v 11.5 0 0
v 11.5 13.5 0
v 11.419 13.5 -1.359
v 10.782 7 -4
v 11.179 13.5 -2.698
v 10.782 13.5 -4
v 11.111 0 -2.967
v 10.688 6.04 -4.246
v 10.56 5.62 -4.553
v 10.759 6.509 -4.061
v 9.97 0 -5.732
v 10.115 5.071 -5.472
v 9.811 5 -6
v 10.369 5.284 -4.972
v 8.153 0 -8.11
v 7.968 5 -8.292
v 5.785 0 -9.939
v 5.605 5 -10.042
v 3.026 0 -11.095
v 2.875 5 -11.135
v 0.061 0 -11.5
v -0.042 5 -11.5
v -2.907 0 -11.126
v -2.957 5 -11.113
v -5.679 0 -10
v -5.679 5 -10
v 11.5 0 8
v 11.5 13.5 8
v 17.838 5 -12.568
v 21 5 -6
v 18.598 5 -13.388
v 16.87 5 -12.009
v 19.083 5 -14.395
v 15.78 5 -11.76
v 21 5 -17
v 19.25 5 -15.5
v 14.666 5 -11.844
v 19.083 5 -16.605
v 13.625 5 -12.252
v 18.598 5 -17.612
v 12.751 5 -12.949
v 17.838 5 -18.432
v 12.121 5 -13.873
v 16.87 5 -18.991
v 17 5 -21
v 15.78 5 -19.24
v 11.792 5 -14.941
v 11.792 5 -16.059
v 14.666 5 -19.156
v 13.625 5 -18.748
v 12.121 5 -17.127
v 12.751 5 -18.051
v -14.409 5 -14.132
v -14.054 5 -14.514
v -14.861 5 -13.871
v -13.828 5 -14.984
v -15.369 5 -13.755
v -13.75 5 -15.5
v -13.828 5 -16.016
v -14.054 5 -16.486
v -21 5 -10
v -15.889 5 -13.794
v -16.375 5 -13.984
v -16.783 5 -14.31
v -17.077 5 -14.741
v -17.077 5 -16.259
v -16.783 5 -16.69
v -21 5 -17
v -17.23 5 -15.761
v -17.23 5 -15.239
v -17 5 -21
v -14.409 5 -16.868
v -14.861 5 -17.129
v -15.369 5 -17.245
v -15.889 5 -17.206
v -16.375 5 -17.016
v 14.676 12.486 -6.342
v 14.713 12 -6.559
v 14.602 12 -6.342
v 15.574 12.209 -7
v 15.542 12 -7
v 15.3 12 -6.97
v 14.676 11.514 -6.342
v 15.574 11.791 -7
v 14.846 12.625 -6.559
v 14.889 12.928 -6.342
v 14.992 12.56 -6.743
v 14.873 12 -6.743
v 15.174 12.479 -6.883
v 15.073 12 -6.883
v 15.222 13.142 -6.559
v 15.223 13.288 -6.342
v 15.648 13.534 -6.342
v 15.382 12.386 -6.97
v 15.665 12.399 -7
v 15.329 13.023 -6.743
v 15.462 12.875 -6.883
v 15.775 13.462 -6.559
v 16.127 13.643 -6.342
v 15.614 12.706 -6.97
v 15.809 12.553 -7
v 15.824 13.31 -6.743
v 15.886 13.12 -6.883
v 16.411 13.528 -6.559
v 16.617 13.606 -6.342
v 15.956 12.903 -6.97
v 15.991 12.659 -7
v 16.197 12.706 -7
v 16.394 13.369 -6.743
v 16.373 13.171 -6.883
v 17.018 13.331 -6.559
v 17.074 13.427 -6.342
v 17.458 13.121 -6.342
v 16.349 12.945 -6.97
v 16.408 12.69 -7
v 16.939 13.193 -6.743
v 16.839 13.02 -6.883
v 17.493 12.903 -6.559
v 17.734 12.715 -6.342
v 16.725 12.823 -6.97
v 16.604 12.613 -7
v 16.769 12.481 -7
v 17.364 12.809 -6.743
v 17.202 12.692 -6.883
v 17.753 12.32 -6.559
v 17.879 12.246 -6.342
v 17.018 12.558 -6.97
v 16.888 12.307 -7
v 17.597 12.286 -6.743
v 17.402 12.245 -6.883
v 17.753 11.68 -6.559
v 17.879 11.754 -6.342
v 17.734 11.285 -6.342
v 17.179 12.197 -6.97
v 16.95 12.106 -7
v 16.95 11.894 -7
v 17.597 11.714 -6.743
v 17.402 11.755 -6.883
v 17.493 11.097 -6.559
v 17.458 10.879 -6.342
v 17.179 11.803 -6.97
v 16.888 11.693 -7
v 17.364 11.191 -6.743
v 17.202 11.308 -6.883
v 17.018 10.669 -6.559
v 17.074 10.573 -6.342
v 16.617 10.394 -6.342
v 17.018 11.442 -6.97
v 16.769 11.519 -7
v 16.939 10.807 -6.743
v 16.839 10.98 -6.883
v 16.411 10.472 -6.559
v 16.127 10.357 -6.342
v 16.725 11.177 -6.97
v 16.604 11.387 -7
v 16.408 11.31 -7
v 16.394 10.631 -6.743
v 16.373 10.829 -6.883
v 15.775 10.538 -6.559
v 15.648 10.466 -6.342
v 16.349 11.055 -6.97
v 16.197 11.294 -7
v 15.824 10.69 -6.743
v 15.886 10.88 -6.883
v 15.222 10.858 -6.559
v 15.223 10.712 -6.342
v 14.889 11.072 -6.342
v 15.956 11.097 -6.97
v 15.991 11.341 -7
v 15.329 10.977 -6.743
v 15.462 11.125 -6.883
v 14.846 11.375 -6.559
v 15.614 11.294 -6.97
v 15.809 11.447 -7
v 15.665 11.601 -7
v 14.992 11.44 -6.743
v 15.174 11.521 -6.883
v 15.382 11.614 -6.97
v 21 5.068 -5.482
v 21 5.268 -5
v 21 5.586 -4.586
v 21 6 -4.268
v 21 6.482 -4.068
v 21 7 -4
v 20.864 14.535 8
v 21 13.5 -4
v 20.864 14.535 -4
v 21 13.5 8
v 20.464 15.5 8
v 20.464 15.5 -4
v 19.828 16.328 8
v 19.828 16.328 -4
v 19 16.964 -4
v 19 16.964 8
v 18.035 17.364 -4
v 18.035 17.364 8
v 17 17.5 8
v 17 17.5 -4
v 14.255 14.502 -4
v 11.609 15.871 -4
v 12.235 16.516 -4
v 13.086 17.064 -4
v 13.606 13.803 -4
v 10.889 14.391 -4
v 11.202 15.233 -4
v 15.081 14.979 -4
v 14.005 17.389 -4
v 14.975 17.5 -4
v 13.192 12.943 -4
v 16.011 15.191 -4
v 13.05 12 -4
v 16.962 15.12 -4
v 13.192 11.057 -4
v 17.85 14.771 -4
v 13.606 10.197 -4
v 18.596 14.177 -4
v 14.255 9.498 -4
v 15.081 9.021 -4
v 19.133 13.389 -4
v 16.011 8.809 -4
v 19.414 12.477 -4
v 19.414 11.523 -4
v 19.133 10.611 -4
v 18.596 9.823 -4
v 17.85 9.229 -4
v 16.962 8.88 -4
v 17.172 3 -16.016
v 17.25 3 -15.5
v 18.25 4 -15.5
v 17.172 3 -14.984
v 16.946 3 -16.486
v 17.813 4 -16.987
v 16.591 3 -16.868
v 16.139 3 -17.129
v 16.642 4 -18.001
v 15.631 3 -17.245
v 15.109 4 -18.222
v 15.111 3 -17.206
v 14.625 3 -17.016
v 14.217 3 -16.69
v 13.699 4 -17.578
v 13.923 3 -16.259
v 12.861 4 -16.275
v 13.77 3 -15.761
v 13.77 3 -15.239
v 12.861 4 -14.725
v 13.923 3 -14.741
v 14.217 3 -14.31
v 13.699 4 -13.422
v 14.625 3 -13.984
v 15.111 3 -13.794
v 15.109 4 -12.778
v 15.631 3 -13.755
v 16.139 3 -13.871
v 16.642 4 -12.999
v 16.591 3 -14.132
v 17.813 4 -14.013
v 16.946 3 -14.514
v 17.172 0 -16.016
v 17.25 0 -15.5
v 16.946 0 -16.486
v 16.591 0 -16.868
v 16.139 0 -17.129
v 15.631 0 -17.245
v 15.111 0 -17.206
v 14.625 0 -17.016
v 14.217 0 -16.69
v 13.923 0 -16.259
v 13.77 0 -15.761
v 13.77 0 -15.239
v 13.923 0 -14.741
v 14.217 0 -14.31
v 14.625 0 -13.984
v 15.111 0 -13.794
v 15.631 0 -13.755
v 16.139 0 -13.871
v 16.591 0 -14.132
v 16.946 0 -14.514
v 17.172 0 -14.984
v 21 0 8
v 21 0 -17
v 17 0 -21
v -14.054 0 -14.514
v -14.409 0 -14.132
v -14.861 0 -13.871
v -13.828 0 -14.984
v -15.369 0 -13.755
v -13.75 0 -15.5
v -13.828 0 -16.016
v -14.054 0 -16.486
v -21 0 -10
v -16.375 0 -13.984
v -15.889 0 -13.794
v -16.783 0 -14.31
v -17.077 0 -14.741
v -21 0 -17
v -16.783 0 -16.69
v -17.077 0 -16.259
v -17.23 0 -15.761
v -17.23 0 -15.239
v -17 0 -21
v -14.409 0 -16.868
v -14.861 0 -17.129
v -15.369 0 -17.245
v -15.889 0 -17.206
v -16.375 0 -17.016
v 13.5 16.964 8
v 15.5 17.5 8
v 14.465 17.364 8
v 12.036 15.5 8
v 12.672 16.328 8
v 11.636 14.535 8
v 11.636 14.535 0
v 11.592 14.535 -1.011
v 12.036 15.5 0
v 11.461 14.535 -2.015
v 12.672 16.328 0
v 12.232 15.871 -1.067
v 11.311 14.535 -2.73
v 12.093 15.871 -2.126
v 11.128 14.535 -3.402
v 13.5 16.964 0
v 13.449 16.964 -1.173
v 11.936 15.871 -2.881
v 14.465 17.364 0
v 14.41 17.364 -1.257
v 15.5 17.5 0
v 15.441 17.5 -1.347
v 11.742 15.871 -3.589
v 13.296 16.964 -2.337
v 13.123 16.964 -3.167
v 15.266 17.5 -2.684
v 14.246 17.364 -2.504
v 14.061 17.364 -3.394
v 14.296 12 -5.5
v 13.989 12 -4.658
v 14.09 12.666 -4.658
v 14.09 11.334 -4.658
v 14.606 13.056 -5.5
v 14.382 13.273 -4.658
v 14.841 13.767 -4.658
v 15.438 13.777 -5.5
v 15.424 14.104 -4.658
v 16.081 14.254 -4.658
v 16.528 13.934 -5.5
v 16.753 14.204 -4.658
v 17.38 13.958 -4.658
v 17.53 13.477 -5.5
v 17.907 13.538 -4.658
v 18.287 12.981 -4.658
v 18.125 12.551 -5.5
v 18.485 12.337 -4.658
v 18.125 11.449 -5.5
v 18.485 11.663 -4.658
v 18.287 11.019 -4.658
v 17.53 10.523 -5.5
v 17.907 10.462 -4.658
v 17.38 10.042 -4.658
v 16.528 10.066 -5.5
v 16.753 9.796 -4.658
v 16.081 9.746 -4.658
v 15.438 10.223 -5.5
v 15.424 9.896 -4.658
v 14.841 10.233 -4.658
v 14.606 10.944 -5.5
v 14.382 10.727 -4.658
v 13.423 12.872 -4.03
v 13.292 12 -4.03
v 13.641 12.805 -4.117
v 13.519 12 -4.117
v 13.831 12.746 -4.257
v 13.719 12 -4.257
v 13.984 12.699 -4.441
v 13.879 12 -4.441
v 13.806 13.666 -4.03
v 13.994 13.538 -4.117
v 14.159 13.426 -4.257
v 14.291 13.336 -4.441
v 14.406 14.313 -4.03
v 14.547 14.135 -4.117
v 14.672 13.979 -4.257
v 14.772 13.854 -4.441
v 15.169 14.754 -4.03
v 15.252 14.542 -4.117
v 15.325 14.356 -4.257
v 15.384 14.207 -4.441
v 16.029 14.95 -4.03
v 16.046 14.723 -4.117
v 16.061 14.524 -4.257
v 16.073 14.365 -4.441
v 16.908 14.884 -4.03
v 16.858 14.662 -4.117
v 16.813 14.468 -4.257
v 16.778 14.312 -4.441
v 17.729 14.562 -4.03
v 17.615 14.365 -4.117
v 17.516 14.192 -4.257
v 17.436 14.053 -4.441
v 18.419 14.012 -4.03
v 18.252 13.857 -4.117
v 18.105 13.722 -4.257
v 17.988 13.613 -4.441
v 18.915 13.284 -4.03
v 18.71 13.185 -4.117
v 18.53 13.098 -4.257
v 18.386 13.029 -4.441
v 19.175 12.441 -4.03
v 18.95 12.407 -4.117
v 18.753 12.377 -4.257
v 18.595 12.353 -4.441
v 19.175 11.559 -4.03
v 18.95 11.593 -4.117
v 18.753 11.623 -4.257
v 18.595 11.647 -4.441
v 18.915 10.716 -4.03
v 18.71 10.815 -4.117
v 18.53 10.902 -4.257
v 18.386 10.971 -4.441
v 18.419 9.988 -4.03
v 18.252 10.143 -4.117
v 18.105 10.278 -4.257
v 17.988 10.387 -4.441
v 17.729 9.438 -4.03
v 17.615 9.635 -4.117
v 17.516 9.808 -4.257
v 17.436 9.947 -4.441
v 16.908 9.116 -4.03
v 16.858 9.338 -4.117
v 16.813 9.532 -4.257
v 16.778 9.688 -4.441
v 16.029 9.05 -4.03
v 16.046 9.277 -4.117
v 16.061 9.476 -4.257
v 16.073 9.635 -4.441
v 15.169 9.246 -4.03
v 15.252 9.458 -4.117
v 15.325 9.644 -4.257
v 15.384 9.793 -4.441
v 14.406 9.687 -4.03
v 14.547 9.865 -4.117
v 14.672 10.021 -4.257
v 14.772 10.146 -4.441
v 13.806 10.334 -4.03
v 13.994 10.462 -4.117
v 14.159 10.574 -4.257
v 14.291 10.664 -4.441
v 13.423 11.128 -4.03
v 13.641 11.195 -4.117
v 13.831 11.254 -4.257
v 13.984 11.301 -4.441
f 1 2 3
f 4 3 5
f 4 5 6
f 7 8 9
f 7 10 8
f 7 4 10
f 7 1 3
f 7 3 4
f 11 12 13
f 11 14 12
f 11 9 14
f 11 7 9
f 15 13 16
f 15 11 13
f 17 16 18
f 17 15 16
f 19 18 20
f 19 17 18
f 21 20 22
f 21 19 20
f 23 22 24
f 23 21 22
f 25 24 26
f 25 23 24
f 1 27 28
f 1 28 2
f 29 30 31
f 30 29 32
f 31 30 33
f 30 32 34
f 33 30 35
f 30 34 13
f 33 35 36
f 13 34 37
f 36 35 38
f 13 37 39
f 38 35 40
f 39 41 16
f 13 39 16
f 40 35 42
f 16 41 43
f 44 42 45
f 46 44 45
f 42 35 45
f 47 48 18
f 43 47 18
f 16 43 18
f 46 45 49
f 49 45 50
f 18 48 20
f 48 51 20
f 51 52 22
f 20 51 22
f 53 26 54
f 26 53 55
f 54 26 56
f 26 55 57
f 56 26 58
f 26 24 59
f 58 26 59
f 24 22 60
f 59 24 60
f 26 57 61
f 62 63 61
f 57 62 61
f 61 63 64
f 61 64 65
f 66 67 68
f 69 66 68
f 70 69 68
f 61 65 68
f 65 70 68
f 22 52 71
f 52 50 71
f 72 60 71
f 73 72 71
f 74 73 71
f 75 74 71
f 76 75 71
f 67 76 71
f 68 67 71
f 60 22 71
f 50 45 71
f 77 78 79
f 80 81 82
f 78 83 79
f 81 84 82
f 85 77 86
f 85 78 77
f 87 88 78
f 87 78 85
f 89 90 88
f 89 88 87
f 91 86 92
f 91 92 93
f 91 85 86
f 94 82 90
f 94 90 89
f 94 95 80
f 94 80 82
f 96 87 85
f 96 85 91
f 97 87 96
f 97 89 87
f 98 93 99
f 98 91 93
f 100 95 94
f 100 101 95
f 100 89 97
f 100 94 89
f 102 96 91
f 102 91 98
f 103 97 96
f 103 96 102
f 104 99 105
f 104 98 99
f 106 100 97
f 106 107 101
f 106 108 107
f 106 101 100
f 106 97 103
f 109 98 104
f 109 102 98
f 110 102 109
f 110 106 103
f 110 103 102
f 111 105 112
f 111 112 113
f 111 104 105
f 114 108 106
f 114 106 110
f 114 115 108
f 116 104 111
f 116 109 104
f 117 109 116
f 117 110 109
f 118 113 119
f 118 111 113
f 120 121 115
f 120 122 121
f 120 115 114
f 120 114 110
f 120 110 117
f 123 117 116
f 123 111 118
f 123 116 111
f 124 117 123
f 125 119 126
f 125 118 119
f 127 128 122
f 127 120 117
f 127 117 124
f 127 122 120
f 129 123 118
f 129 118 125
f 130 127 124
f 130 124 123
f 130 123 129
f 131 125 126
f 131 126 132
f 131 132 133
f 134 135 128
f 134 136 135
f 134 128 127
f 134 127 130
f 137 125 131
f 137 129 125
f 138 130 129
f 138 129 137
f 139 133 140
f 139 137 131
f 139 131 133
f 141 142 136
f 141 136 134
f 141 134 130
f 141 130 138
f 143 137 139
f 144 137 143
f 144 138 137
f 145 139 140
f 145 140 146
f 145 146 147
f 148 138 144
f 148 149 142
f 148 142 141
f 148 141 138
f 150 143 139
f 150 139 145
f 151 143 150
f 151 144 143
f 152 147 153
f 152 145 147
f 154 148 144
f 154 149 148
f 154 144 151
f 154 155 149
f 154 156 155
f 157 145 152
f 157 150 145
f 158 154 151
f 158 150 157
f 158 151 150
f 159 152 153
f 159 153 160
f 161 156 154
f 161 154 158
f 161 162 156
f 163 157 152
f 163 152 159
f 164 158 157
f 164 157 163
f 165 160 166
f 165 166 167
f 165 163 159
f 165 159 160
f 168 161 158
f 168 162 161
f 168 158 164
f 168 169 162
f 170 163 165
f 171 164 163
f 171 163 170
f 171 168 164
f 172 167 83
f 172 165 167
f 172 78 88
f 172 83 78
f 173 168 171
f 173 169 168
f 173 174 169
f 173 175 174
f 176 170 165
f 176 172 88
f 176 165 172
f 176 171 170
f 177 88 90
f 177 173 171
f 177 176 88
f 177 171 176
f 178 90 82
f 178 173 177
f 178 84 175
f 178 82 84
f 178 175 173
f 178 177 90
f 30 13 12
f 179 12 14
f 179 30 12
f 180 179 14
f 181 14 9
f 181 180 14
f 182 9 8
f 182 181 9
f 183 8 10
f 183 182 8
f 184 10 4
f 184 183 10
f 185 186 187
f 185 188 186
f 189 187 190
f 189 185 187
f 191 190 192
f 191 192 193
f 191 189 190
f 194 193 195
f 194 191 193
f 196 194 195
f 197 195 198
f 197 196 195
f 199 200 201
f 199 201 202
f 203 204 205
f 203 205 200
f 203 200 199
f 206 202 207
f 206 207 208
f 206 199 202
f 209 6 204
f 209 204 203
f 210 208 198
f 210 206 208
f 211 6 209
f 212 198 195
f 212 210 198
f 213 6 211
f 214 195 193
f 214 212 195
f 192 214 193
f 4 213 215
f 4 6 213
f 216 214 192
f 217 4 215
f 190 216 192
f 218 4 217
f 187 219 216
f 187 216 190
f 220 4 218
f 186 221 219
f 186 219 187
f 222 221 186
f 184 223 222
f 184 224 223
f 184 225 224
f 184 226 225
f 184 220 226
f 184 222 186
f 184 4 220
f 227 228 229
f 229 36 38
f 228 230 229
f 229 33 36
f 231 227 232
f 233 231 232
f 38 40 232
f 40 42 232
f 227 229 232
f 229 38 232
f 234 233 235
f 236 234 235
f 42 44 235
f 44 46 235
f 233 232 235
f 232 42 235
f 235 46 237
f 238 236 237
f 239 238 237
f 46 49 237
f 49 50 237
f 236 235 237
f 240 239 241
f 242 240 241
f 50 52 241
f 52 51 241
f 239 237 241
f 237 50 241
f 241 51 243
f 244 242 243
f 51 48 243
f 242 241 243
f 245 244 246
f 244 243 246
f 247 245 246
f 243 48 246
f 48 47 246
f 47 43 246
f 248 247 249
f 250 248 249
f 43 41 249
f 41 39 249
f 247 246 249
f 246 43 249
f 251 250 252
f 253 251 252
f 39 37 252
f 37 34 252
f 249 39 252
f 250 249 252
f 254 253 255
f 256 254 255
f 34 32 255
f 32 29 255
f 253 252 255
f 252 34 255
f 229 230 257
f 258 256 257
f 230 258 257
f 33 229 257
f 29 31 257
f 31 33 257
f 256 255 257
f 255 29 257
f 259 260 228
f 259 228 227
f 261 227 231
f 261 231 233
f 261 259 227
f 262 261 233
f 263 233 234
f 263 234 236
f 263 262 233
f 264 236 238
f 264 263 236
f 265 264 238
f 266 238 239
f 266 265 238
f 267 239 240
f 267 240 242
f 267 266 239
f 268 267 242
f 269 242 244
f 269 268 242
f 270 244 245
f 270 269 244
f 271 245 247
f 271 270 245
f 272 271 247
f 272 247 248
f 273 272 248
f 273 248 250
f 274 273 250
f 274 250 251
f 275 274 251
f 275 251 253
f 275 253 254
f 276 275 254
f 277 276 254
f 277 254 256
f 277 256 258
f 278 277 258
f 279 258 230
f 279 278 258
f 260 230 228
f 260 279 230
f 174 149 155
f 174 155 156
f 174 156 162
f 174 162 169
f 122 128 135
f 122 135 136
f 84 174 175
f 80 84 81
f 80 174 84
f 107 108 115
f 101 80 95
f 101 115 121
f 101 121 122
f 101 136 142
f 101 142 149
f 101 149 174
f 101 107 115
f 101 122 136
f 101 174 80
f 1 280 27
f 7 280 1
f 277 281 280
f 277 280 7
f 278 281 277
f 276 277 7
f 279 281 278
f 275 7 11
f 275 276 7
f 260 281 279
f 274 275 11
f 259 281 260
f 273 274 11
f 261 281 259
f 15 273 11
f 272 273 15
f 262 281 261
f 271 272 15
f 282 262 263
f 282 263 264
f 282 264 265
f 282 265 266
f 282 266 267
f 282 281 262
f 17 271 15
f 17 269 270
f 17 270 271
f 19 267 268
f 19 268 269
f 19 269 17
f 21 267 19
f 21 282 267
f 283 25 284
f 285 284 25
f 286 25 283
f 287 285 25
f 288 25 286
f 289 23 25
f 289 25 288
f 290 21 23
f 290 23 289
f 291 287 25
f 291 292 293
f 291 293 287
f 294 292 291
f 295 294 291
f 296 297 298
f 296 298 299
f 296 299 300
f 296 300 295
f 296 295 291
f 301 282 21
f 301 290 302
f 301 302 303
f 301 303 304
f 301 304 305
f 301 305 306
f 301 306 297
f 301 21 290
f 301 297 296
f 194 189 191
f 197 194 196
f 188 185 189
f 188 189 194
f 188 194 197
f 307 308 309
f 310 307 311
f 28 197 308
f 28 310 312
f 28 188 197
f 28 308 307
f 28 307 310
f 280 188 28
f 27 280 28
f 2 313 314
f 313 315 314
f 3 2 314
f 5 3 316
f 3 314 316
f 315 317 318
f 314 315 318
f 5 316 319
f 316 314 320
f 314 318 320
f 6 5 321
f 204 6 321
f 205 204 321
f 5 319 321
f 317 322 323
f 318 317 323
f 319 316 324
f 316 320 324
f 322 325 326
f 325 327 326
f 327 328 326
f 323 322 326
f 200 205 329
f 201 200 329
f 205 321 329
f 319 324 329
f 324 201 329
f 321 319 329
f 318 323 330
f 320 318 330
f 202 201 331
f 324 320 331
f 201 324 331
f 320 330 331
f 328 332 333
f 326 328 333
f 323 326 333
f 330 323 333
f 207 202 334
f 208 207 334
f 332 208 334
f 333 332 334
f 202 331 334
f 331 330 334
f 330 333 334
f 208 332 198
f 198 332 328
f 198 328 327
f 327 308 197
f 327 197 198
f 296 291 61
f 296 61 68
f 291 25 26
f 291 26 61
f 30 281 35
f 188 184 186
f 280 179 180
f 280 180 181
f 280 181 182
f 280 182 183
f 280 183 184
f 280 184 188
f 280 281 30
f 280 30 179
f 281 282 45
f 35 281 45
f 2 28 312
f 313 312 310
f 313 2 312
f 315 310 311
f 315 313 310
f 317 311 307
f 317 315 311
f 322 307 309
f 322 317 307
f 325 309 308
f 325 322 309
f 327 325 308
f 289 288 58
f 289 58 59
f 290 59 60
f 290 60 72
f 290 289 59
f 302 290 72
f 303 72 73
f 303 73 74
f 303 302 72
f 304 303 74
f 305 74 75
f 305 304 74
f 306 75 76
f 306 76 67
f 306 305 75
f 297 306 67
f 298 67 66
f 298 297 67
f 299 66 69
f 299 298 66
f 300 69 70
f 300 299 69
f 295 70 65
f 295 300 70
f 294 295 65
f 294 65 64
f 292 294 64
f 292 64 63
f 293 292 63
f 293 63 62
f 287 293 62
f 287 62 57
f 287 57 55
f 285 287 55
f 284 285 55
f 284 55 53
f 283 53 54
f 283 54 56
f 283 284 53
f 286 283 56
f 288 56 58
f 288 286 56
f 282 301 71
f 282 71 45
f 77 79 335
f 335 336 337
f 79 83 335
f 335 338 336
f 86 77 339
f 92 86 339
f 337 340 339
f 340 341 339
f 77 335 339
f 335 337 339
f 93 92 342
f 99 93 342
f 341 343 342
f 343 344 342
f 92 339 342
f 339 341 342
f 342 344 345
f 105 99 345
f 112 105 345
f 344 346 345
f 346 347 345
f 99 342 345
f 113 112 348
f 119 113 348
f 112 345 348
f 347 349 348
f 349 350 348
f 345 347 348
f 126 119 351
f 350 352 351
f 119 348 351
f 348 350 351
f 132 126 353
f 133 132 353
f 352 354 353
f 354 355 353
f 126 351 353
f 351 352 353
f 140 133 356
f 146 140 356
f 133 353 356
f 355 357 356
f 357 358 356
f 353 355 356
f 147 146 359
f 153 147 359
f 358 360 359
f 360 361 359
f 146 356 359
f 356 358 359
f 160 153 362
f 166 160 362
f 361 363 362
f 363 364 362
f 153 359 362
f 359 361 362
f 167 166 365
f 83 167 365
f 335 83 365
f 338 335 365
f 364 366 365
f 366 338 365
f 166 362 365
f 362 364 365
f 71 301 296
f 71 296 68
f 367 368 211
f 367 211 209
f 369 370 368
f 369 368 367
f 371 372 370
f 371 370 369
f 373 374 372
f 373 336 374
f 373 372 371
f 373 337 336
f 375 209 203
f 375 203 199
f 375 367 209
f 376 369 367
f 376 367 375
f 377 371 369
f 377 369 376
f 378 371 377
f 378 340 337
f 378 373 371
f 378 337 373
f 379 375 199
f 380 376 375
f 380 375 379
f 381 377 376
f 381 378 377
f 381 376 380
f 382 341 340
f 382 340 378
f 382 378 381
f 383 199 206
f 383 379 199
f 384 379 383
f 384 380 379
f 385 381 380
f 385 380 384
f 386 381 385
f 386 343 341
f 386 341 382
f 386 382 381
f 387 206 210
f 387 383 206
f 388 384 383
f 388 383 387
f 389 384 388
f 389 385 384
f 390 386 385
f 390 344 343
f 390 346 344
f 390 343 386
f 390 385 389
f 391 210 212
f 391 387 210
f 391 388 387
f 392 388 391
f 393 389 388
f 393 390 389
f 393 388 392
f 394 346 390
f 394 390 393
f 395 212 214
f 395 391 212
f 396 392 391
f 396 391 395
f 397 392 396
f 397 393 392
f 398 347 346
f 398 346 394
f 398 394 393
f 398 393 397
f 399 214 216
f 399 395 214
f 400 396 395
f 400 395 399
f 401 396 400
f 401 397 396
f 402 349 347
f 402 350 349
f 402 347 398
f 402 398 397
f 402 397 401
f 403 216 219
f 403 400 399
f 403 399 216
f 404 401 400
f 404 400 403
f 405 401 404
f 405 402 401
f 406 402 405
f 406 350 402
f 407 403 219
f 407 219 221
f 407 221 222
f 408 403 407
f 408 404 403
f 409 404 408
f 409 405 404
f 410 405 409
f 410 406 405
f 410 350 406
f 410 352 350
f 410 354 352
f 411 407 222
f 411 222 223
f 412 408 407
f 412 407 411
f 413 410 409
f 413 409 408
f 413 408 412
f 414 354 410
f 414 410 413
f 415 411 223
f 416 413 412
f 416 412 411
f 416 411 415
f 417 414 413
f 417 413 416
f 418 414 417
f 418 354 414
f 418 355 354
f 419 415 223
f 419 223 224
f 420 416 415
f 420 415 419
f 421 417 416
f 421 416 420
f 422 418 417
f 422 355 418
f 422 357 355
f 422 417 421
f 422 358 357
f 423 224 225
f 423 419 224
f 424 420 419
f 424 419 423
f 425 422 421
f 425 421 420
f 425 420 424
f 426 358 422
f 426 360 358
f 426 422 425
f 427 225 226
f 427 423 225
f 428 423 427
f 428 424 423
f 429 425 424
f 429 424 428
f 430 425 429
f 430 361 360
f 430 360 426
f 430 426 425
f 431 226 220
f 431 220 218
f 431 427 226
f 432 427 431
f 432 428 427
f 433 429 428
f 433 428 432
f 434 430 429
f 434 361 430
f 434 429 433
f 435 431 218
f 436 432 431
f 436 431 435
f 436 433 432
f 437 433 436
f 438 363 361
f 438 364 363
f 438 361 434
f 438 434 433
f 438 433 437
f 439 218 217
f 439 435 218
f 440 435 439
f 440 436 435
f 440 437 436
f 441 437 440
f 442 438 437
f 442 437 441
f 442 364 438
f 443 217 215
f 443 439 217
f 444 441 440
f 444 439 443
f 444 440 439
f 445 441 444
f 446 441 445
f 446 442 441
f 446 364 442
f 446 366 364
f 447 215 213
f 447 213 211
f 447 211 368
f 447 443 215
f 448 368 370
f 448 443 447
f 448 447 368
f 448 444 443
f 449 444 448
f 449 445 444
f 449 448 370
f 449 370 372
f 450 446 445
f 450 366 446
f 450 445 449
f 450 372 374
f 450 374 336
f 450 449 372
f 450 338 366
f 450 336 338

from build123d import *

# Parameters (mm, degrees)
CROQUIS1_R              = 1.75
SALIENTE_EXTRUIR1_DEPTH = 5
CHAFL_N1_SIZE           = 2
SALIENTE_EXTRUIR2_DEPTH = 17.5
CROQUIS4_R              = 2.5
SALIENTE_EXTRUIR3_DEPTH = 3
NGULO_DE_SALIDA1_ANGLE  = 20
REDONDEO1_R             = 1
CHAFL_N2_SIZE           = 4
REDONDEO2_R             = 2
REDONDEO4_R             = 4


with BuildPart() as part:
    # Croquis1 → Saliente-Extruir1 (new body)
    with BuildSketch(Plane(origin=(0, 0, 0), x_dir=(1, 0, 0), z_dir=(0, 1, 0))):
        with BuildLine():
            Line((-21, 21), (21, 21))
            Line((21, 21), (21, -8))
            Line((21, -8), (11.5, -8))
            Line((11.5, -8), (11.5, 0))
            ThreePointArc((11.5, 0), (5.785436631, 9.938748562), (-5.678908346, 10))
            Line((-5.678908346, 10), (-21, 10))
            Line((-21, 10), (-21, 21))
        make_face()
        with Locations((-15.5, 15.5)):
            Circle(CROQUIS1_R, mode=Mode.SUBTRACT)
        with Locations((15.5, 15.5)):
            Circle(CROQUIS1_R, mode=Mode.SUBTRACT)
    extrude(amount=SALIENTE_EXTRUIR1_DEPTH)

    # Chaflán1
    chafl_n1_edges = [part.edges().sort_by_distance(p)[0] for p in [
        (13.75, 5, -15.5),
    ]]
    chamfer(chafl_n1_edges, length=CHAFL_N1_SIZE)

    # Croquis3 → Saliente-Extruir2 (add)
    with BuildSketch(Plane.XZ):
        with BuildLine():
            Line((10.781929326, -4), (21, -4))
            Line((21, -4), (21, 0))
            Line((21, 0), (21, 8))
            Line((21, 8), (11.5, 8))
            Line((11.5, 8), (11.5, 0))
            ThreePointArc((11.5, 0), (11.319058867, -2.031971056), (10.781929326, -4))
        make_face()
    extrude(amount=-SALIENTE_EXTRUIR2_DEPTH)

    # Croquis4 → Saliente-Extruir3 (add)
    with BuildSketch(Plane(origin=(0, 0, -4), x_dir=(-1, 0, 0), z_dir=(0, 0, -1))):
        with Locations((-16.25, 12)):
            Circle(CROQUIS4_R)
    extrude(amount=SALIENTE_EXTRUIR3_DEPTH)

    # Ángulo de salida1
    ngulo_de_salida1_faces = [part.faces().sort_by_distance(p)[0] for p in [
        (18.75, 12, -5.5),
    ]]
    draft(ngulo_de_salida1_faces, Plane(origin=(10.781929326, 17.5, -4), x_dir=(-1, 0, 0), z_dir=(0, 0, -1)), NGULO_DE_SALIDA1_ANGLE)

    # Redondeo1
    redondeo1_edges = [part.edges().sort_by_distance(p)[0] for p in [
        (18.75, 12, -4),
        (17.658089297, 12, -7),
    ]]
    fillet(redondeo1_edges, radius=REDONDEO1_R)

    # Chaflán2
    chafl_n2_edges = [part.edges().sort_by_distance(p)[0] for p in [
        (-21, 2.5, -21),
        (21, 2.5, -21),
    ]]
    chamfer(chafl_n2_edges, length=CHAFL_N2_SIZE)

    # Redondeo2
    redondeo2_edges = [part.edges().sort_by_distance(p)[0] for p in [
        (15.890964663, 5, -4),
    ]]
    fillet(redondeo2_edges, radius=REDONDEO2_R)

    # Redondeo4
    redondeo4_edges = [part.edges().sort_by_distance(p)[0] for p in [
        (21, 17.5, 2),
        (11.319058867, 17.5, -2.031971056),
        (11.5, 17.5, 4),
    ]]
    fillet(redondeo4_edges, radius=REDONDEO4_R)


solid = part.part
